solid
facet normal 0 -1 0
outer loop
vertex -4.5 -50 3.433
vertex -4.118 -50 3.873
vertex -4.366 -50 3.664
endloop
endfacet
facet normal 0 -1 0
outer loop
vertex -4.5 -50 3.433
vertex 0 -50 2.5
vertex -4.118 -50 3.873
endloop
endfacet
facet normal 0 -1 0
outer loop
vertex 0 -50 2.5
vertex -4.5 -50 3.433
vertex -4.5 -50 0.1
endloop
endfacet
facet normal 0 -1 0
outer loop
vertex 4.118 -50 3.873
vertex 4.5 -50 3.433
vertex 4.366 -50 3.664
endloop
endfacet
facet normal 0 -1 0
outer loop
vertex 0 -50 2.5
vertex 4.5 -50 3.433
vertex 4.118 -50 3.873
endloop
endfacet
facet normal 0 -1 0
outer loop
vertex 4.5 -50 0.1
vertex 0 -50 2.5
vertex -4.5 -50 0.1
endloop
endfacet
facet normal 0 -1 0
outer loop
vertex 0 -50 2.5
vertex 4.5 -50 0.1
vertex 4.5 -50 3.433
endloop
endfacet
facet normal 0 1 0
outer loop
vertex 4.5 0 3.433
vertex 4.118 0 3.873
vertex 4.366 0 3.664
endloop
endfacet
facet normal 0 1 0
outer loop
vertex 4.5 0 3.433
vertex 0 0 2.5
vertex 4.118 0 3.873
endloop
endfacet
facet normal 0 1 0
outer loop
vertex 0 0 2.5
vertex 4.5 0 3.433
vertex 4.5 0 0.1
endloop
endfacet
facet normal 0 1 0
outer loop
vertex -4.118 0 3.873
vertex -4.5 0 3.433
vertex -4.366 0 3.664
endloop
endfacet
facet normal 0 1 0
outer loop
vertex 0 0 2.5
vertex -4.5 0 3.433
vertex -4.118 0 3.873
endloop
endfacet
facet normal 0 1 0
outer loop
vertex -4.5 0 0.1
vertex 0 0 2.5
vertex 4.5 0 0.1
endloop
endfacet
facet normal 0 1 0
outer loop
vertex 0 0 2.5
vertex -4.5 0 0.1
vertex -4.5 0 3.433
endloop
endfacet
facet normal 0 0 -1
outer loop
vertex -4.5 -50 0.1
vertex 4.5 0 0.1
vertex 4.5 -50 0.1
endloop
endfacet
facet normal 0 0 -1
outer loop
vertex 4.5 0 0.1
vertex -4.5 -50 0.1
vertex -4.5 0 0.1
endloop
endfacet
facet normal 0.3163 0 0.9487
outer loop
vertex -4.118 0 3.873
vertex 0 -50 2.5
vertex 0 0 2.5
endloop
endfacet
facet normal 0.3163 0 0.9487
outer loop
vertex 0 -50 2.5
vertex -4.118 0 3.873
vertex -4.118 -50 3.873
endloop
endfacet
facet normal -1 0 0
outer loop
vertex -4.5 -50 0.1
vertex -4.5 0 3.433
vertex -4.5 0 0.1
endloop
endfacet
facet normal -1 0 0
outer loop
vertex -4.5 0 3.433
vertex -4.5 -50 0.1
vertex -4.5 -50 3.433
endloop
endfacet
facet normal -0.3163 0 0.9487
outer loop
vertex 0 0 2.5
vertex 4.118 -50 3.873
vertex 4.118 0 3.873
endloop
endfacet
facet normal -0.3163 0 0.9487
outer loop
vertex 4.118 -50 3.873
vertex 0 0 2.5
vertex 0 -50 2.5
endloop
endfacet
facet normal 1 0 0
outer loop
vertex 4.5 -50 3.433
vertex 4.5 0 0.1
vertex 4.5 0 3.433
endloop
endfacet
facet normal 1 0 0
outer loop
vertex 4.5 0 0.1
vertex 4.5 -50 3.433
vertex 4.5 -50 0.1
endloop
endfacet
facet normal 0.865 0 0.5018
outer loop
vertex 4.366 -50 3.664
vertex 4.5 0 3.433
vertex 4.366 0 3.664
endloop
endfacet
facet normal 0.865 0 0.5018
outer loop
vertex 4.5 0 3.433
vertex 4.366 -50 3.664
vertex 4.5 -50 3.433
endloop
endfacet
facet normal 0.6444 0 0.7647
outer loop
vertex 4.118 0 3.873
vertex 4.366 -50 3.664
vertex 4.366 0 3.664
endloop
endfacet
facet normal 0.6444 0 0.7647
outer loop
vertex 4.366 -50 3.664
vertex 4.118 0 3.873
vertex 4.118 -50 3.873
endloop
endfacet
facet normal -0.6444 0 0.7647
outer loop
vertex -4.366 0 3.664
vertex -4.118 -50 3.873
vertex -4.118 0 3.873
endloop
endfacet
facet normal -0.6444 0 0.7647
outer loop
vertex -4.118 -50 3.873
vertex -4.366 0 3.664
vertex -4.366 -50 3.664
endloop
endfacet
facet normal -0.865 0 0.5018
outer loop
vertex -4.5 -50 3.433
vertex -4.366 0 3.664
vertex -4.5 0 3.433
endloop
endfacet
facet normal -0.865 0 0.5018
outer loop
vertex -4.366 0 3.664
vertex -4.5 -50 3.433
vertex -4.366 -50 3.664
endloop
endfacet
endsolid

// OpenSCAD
// file: ../../globals.scad
/*
Most things in this file is represented as one millimeter, so keep that in mind while changing things.
Some of the setting are not mm but at variables that you can set, such as 2*x=2x and you are setting what x is.
I will try to specify when things are variables and not exact measurements.
*/

//Virindi settings
dovetail_male_width_scale = 0.98;
dovetail_male_height_scale = 0.91;

obj_leg = 30;
leg_length = 5.5;
small_number = 0.001;
metal_core_rode_global = 5;


///////////////// number of holes /////////////////////
z_hole_number = 8;
other_holes = 8;

///////////////// Pins /////////////////////

//pins that poke out
ball_size = 10;
pin_height = 20;
pin_diameter = 6;


//holes
hole_ball_size = ball_size;
hole_pin_height = pin_height;
hole_pin_diameter = pin_diameter;

///////////////// Z THINGS /////////////////////

berring_slot_width = 7.5;
berring_slot_depth = 6.5;
metal_core_rode = 5;

///////////////// X THINGS /////////////////////

//male dove tails
max_width=8;
min_width=5;
depth=5;
height=obj_leg/2;

//female dove tails, this is found on the y mounts
girl_max_width=11;
girl_min_width=5;
girl_depth=5;
girl_height=obj_leg;


///////////////// Y THINGS /////////////////////
/*
The Y is so normal that all of those global variables at the top should change all of the setting in it, this section is set her incase there are variables set in the future development of this project.
*/
// file: ../../include.scad
//////////////////      END SECTION       //////////////////

	module added_pins(){
		difference(){
			union(){
				translate([30/(15/4),obj_leg*leg_length,30/(15/4)]) pin();
				translate([30/(15/4)+14.5,obj_leg*leg_length,30/(15/4)+14]) pin();
			}
			union(){
							translate([30/(15/4)+13.5,obj_leg*leg_length-20,30/(15/4)+5])cube(size=[2,40,15]);
							translate([30/(15/4)+7.5,obj_leg*leg_length-20,30/(15/4)+15])rotate([0,90,0]) cube(size=[2,40,15]);	

							translate([30/(15/4)-1,obj_leg*leg_length-20,30/(15/4)-8])cube(size=[2,40,15]);
							translate([30/(15/4)-10,obj_leg*leg_length-20,30/(15/4)+1])rotate([0,90,0]) cube(size=[2,40,15]);
			}
		}
	}
	module taken_pins() {
		translate([30/(15/4)+14,obj_leg*leg_length-10,30/(15/4)]) mirror_pin();
		translate([30/(15/4),obj_leg*leg_length-10,30/(15/4)+15]) mirror_pin();
	}


//////////////////      OTHER STUFF       //////////////////

	module holes() {
		rotate([0,0,90]) for(y=[0:other_holes])
		translate([obj_leg+y*15,-15.5,7.5]) union() {
			translate([7.5,0,15]) hole_up();
			hole_down();
		}
	}
	module extend_holes() {
	module top(){
		rotate([0,0,90]) for(y=[0:other_holes+1])
		translate([(30/4)+y*15,-15.5,7.5]) union() {
			translate([7.5,0,15]) hole_up();
		}
	}
	module bottom(){
		rotate([0,0,90]) for(y=[0:other_holes+2])
		translate([(30/4)+y*15,-15.5,7.5]) union() {
			hole_down();
		
}
	}
	union(){
		top();
		bottom();
	}
	}

	module hole() {
		union() {
			rotate([90, 90, 0]) cylinder(h=40, d=hole_pin_diameter, center=true);
			translate([0,7.5,0]) sphere(d=hole_ball_size);
			translate([0,-6,0]) sphere(d=hole_ball_size);
		}
	}
	module hole_up() {
		union() {
			rotate([90, 90, 0]) cylinder(h=40, d=hole_pin_diameter, center=true);
			translate([0,7.5,10]) cylinder(h=hole_pin_height, d=hole_pin_diameter, center=true);
			translate([0,-6,10]) cylinder(h=hole_pin_height, d=hole_pin_diameter, center=true);
			translate([0,7.5,0]) sphere(d=hole_ball_size);
			translate([0,-6,0]) sphere(d=hole_ball_size);
		}
	}
	module hole_down() {
		union() {
			rotate([90, 90, 0]) cylinder(h=40, d=hole_pin_diameter, center=true);
			translate([0,7.5,-10]) cylinder(h=hole_pin_height, d=hole_pin_diameter, center=true);
			translate([0,-6,-10]) cylinder(h=hole_pin_height, d=hole_pin_diameter, center=true);
			translate([0,7.5,0]) sphere(d=hole_ball_size);
			translate([0,-6,0]) sphere(d=hole_ball_size);
		}
	}
	module pin() {
		union() {
			rotate([90, 90, 0]) cylinder(h=pin_height, d=pin_diameter, center=true);
			translate([0,7.5,0]) sphere(d=ball_size);
		}
	}

	module mirror_pin() {
		rotate([90, 90, 0]) cylinder(h=hole_pin_height+small_number, d=hole_pin_diameter, center=true);
		translate([0,-(pin_height-(ball_size/2)),0]) sphere(d=ball_size);
	}


//////////////////      SOME RACK AND Z THINGS       //////////////////

module z_holes() {
    rotate([0,-90,0]) for(z=[0:z_hole_number])
    translate([22.5+z*15,16,-12])
        hole();
}

module pin_cuts() {
	union(){
		cube(size=[2,10,40], center=true);
		rotate([0,0,90]) cube(size=[2,10,40], center=true);
	}
}
module pin_uncut() {
	union(){
		rotate([0, 0, 90]) cylinder(h=hole_pin_height, d=hole_pin_diameter, center=true);
		translate([0,0,10]) sphere(d=ball_hole);
	}
}


module pin_out() {
	union(){
		rotate([0, 0, 90]) cylinder(h=pin_height, d=pin_diameter, center=true);
		translate([0,0,10]) sphere(d= ball_size);
	}
}


module pins_z(){
	difference() {
		pin_out();
		pin_cuts();
	}
}
//////////////////      RACK AND SLIDE     ///////////////////

module straight_pins() {
	for(z=[0:((((obj_leg*leg_length)*2)-(obj_leg*2))/3)/14.5]) rotate([-90,0,0]) translate([z*15,30/(15/4),14]) pins_z();
	for(z=[0:((((obj_leg*leg_length)*2)-(obj_leg*2))/3)/14.5]) rotate([-90,0,0]) translate([z*15,30/(15/4)-14,14]) pins_z();
}
module stagger_pins() {
	for(z=[0:((((obj_leg*leg_length)*2)-(obj_leg*2))/3)/14.5]) rotate([-90,0,0]) translate([z*15,30/(15/4),14]) pins_z();
	for(z=[0:((((obj_leg*leg_length)*2)-(obj_leg*2))/3)/14.5]) rotate([-90,0,0]) translate([z*15+7,30/(15/4)-14,14]) pins_z();
}


//////////////////      DOVE TAIL       //////////////////

module male_dovetail(height) {
	dovetail_3d(max_width,min_width,depth,height);
}

module dovetail_3d(max_width=11, min_width=5, depth=5, height=30) {
	linear_extrude(height=height, convexity=2)
		dovetail_2d(max_width,min_width,depth);
}

module dovetail_2d(max_width=11, min_width=5, depth=5) {
	angle=atan((max_width/2-min_width/2)/depth);
	echo("angle: ", angle);
	polygon(paths=[[0,1,2,3,0]], points=[[-min_width/2,0], [-max_width/2,depth], [max_width/2, depth], [min_width/2,0]]);
}

//bow tie
	module tie_end(height){
				rotate([0,0,0]) translate([0,-0.01,((obj_leg/2)/2)]) male_dovetail(height);
				rotate([0,90,0]) translate([0,-0.01,((obj_leg/2)/2)]) male_dovetail(height);
				rotate([0,180,0]) translate([0,-0.01,((obj_leg/2)/2)]) male_dovetail(height);
				rotate([0,-90,0]) translate([0,-0.01,((obj_leg/2)/2)]) male_dovetail(height);
	}

module bow_support(){
	difference(){
		intersection(){
			translate([-15,0,-15]) cube([30,9,30]);
			scale([1.05,1.05,1.05]) rotate([0,45,0]) tie_end();
		}
		cube([29.2,29.2,29.2], center=true);
	}
}

	module wrap(units){
	for (y = [-1:units-2]) // two iterations, z = -1, z = 1
	{
			translate([15, (y*30)+15, 15]){
			for (r = [0:4]) // two iterations, z = -1, z = 1
			{
				rotate([0,r*90,0]) translate([0,15,15]) rotate([-90,0,0])male_dovetail(height=30);
			}
		}
	}
	}
// main file
length = 50;
tilt_level = 1.1;
scaling_x = .9;
scaling_y = 1;
scaling_z = 1;
include <../../include.scad>;
include <../../globals.scad>;

obj_leg= 12;

module half_dove() {
    intersection() {
        #translate([0.1,0,0]) cube([10, 10, length]);
        male_dovetail(height=length);
    }
}

module bow_tie_master(){
	union(){
		mirror([0,1,0]){
			half_dove();
		}
		half_dove();		
	}
}

intersection(){
    scale([scaling_x,scaling_y,scaling_z])	rotate([90,270,0]) bow_tie_master();
    rotate([90,0,0]) cylinder(r=5.7, h=200);
}
